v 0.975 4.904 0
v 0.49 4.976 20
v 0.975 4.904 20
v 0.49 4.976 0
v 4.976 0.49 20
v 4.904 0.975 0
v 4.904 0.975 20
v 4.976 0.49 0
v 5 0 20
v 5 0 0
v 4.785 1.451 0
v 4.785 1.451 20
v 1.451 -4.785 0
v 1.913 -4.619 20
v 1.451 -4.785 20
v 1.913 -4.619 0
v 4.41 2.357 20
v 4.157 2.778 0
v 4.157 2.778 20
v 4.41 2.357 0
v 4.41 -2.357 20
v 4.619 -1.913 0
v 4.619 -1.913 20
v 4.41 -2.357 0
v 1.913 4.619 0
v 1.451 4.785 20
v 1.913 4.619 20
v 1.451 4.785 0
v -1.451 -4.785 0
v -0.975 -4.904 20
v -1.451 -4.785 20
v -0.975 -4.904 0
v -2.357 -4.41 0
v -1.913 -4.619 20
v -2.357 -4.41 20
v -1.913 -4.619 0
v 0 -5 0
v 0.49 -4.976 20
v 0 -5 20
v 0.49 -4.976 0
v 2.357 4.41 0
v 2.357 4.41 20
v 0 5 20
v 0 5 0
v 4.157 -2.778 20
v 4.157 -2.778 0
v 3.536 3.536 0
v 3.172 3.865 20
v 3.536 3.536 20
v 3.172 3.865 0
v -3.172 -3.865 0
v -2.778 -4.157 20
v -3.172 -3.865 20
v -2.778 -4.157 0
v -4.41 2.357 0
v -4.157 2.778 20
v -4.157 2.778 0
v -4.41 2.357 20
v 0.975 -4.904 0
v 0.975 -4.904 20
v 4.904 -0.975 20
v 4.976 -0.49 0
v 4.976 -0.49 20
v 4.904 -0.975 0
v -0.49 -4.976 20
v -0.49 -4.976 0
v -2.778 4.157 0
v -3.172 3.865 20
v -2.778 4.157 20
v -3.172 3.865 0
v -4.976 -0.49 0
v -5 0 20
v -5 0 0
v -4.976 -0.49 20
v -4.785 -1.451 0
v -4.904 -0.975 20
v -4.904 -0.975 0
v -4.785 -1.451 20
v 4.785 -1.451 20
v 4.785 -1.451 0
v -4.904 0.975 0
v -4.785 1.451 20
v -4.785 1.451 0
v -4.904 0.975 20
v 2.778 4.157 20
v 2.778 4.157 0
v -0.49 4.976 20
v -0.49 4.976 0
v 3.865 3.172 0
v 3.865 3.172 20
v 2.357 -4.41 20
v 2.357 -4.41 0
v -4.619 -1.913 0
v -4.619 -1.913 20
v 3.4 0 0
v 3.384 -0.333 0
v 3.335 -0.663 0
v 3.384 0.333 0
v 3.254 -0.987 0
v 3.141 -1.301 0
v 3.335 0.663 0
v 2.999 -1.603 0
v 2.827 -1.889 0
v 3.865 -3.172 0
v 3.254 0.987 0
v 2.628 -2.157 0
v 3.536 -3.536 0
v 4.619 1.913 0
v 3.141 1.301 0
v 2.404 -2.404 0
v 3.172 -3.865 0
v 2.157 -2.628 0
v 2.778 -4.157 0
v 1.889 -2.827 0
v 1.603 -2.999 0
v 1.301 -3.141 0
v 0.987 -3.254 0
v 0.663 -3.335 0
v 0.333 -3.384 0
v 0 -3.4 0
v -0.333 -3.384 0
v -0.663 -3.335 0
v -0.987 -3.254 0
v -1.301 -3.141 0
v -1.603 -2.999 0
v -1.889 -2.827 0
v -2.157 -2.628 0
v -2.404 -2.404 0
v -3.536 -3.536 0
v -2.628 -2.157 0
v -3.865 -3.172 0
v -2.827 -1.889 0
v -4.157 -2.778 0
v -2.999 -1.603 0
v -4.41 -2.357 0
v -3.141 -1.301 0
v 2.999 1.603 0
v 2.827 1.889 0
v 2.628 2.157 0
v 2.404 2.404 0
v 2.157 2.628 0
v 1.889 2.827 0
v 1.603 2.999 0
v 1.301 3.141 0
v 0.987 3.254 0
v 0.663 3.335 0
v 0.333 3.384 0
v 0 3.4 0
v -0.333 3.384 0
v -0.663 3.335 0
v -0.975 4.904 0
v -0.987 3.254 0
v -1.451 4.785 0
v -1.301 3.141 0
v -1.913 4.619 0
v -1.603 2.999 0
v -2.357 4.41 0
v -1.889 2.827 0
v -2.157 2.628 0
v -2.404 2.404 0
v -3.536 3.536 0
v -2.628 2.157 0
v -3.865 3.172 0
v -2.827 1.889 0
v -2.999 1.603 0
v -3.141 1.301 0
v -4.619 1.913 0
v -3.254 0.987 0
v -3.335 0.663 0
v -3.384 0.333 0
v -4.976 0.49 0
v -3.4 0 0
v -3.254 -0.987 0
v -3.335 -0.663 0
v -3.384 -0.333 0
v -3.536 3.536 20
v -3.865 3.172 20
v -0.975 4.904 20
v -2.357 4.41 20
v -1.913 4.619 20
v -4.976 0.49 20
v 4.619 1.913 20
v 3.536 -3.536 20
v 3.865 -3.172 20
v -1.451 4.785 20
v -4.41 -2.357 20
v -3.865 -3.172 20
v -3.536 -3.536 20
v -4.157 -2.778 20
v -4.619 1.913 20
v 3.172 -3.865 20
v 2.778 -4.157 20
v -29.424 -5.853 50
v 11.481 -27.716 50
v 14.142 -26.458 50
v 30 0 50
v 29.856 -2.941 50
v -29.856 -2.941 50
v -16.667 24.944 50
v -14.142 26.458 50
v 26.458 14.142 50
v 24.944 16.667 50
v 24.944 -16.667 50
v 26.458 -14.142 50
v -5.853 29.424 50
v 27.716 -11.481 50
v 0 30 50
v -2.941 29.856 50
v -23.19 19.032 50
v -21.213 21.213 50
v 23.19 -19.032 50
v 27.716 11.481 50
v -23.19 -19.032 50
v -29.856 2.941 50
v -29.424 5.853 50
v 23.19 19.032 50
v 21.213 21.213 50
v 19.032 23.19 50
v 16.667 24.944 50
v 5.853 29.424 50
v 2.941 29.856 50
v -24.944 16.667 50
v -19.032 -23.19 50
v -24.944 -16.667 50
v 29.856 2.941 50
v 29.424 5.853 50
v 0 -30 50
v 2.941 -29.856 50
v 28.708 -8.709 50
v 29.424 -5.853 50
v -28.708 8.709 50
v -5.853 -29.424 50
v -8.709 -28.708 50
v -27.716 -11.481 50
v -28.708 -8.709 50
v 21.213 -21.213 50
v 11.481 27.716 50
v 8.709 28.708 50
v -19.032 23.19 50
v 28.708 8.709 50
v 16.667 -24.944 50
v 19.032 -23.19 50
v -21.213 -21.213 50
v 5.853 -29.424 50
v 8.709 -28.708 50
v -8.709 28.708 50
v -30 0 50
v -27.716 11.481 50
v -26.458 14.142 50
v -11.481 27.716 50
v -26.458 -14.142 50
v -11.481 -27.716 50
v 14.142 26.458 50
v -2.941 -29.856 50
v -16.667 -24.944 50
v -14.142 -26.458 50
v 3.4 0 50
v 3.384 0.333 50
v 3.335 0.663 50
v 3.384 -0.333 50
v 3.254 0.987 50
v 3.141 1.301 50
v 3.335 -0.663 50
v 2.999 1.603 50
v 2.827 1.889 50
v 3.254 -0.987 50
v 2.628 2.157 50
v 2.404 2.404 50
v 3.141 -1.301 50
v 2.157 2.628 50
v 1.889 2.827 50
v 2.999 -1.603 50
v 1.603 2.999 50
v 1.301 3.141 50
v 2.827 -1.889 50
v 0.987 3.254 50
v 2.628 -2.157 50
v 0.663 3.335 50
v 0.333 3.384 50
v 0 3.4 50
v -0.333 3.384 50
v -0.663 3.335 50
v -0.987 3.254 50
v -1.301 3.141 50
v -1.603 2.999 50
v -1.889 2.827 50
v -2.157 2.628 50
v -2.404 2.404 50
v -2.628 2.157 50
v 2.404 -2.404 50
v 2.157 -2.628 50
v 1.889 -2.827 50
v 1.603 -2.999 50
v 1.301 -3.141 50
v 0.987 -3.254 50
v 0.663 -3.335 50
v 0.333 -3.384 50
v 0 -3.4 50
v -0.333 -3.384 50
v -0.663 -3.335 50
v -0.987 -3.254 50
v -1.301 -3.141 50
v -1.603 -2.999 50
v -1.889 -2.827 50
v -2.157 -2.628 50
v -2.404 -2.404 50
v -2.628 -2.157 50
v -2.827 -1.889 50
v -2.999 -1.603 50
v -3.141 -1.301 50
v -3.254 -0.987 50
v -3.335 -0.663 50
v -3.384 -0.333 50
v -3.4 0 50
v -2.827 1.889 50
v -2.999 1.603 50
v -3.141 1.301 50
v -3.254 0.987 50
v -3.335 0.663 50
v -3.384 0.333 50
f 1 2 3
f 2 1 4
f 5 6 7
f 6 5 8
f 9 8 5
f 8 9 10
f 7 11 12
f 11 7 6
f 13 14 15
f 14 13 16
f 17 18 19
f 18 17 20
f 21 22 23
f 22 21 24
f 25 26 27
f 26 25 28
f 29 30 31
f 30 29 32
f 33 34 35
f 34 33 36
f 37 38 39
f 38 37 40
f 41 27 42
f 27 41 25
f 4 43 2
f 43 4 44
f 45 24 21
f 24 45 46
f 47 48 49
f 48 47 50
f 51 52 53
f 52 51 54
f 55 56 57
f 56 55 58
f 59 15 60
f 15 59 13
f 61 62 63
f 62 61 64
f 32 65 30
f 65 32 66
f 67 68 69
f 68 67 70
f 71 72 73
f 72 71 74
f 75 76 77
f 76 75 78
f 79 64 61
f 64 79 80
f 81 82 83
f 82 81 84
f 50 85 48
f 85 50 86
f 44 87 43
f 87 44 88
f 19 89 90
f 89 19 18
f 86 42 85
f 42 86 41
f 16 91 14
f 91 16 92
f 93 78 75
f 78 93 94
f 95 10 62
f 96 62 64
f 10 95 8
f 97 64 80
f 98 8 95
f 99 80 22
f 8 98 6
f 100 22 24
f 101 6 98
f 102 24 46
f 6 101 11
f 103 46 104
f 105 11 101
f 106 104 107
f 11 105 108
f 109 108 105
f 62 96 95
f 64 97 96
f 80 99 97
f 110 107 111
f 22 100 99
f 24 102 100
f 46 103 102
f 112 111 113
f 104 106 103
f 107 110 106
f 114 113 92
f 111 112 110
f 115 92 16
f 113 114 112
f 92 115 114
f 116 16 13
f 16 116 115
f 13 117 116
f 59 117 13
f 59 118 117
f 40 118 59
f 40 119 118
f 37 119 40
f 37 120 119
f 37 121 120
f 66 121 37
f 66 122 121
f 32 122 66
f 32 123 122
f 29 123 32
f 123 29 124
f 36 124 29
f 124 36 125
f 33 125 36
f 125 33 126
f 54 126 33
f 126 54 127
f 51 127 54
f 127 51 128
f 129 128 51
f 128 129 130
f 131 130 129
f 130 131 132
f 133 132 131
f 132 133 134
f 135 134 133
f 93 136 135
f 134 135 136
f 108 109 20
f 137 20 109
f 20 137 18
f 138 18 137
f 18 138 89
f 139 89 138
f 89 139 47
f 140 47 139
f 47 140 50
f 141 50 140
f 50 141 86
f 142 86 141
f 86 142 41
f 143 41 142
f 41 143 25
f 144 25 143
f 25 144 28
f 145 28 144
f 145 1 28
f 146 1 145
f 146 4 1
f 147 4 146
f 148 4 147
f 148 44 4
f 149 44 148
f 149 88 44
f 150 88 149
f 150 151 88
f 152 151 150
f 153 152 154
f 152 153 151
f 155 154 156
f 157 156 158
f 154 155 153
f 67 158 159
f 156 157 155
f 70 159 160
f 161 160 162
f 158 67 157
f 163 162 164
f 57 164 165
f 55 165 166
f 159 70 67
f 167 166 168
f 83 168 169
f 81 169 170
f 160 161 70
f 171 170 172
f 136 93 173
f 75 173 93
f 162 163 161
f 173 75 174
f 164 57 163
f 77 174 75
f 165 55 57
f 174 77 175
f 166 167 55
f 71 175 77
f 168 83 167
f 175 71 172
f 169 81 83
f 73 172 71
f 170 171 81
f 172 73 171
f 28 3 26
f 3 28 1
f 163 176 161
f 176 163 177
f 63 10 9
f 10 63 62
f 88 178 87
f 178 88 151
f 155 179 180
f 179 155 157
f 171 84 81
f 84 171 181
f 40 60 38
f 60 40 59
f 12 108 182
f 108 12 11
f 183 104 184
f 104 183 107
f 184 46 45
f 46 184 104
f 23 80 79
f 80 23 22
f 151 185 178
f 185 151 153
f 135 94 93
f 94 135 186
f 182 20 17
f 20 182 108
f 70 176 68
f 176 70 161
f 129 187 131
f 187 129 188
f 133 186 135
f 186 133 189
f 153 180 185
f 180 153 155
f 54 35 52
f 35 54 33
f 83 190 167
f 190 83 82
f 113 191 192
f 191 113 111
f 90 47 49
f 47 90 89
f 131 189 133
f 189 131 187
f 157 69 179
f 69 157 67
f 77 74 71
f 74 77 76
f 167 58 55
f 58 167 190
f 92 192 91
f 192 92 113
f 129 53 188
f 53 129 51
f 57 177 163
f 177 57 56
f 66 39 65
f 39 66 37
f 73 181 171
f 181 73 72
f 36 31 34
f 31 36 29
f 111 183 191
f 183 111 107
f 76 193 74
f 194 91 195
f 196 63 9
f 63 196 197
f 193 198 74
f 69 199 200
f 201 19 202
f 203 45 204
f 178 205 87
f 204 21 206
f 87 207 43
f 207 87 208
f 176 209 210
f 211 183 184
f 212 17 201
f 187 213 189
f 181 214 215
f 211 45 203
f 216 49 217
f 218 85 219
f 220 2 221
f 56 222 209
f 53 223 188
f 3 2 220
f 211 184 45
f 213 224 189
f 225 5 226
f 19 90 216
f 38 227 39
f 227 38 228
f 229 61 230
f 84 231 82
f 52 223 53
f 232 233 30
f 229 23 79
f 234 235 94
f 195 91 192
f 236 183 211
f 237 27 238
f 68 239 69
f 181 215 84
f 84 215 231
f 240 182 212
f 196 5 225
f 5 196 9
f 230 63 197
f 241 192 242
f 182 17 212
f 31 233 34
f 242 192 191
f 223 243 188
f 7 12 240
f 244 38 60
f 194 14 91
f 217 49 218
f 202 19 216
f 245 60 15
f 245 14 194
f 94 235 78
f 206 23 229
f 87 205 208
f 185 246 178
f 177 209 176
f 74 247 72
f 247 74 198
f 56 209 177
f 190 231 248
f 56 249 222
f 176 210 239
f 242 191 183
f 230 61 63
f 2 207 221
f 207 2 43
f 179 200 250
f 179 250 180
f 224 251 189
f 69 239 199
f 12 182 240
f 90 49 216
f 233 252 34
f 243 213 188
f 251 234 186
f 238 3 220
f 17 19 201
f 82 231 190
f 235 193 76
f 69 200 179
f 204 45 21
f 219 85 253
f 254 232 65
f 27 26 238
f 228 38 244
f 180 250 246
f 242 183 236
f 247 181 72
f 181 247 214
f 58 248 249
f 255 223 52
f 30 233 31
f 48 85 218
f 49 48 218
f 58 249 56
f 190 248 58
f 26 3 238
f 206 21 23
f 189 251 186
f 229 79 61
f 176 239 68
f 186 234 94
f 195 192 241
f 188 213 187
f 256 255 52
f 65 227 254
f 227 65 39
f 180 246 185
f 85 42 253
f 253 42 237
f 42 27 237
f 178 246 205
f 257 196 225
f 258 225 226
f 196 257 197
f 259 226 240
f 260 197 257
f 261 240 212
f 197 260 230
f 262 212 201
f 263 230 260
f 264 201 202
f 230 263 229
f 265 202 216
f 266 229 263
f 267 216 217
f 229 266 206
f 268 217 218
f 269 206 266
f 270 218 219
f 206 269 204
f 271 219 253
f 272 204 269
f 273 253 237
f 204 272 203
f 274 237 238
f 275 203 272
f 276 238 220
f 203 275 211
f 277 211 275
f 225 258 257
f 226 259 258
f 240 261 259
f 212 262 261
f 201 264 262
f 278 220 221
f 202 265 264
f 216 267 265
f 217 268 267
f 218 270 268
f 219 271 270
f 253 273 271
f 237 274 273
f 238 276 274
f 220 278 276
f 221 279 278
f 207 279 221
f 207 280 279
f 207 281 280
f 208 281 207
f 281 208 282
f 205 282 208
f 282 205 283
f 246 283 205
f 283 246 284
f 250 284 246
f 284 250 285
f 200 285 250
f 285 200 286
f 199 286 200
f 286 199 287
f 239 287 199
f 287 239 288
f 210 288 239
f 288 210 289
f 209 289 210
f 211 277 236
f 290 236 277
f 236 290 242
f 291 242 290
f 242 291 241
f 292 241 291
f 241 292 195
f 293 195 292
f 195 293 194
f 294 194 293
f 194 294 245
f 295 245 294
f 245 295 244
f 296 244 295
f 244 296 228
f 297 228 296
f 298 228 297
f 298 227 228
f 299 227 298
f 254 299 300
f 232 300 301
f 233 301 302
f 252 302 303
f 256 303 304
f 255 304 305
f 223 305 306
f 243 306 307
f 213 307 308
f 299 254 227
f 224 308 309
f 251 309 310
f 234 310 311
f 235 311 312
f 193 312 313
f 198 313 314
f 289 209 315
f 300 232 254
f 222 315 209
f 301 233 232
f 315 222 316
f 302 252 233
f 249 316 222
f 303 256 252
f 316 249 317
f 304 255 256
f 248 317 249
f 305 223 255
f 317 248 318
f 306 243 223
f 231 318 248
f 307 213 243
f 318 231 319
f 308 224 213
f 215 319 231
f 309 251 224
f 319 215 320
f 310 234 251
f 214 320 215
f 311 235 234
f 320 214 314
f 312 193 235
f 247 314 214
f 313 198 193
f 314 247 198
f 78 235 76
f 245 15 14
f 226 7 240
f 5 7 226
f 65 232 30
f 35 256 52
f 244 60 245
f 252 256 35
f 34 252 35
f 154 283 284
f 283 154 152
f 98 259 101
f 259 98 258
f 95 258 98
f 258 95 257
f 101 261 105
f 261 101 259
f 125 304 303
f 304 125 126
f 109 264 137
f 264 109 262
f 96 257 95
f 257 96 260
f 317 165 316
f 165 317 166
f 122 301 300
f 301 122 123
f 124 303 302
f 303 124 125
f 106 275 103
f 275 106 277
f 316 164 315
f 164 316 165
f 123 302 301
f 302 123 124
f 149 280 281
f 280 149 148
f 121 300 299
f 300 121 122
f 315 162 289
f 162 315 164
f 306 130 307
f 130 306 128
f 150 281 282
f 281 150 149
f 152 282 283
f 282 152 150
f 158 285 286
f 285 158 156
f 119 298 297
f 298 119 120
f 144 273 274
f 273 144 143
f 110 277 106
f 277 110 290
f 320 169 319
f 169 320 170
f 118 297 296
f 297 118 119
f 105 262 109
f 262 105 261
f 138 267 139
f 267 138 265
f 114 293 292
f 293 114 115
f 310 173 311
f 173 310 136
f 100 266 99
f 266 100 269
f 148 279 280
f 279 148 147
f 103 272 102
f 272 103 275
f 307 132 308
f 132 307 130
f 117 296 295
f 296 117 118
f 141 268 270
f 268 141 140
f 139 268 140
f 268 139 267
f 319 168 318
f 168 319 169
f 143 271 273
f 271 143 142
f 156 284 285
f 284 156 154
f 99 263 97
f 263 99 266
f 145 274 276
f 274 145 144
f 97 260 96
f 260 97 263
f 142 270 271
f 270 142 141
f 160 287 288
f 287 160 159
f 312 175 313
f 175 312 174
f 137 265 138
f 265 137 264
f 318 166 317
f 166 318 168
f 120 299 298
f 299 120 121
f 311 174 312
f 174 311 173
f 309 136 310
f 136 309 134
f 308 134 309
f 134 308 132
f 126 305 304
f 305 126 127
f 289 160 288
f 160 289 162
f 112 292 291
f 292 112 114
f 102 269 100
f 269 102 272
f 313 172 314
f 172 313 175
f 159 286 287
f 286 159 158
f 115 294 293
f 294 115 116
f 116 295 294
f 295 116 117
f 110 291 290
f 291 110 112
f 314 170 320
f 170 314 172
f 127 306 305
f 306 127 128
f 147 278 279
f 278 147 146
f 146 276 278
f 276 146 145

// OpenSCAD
// Funnel with spout - printed upright, wide opening at the top
// Units: mm. Straight spout (tube) from z = 0 to z = 20, then a cone
// widens to the rim at z = 50. Wall 1.6 mm thick. Open at top and bottom.

$fn = 64;

// ---- Dimensions ----
spout_d        = 10;    // spout outer diameter
spout_bore     = 6.8;   // spout bore diameter (10 - 2*1.6)
spout_h        = 20;    // spout height (z = 0 to z = 20)
cone_top_d     = 10;    // cone outer diameter at z = 20 (spout top)
cone_rim_d     = 60;    // cone outer diameter at rim (z = 50)
wall           = 1.6;   // wall thickness everywhere
eps            = 0.5;   // cutter overshoot past faces

// Derived
cone_rim_h      = 50;                    // rim height (z = 50)
cone_slope      = (cone_rim_d - cone_top_d) / (cone_rim_h - spout_h);  // 1 mm / 15 mm

// ---- Model ----
difference() {
    union() {
        // Spout: cylinder, z = 0 to 20
        cylinder(d = spout_d, h = spout_h);

        // Cone: radius grows from 5 mm at z = 20 to 30 mm at z = 50
        translate([0, 0, spout_h])
            cylinder(r1 = cone_top_d / 2,
                     r2 = cone_rim_d / 2,
                     h  = cone_rim_h - spout_h);
    }

    // Through-bore: same diameter as the spout bore, runs the full height
    translate([0, 0, -eps])
        cylinder(d = spout_bore, h = spout_h + cone_rim_h + 2 * eps);
}
